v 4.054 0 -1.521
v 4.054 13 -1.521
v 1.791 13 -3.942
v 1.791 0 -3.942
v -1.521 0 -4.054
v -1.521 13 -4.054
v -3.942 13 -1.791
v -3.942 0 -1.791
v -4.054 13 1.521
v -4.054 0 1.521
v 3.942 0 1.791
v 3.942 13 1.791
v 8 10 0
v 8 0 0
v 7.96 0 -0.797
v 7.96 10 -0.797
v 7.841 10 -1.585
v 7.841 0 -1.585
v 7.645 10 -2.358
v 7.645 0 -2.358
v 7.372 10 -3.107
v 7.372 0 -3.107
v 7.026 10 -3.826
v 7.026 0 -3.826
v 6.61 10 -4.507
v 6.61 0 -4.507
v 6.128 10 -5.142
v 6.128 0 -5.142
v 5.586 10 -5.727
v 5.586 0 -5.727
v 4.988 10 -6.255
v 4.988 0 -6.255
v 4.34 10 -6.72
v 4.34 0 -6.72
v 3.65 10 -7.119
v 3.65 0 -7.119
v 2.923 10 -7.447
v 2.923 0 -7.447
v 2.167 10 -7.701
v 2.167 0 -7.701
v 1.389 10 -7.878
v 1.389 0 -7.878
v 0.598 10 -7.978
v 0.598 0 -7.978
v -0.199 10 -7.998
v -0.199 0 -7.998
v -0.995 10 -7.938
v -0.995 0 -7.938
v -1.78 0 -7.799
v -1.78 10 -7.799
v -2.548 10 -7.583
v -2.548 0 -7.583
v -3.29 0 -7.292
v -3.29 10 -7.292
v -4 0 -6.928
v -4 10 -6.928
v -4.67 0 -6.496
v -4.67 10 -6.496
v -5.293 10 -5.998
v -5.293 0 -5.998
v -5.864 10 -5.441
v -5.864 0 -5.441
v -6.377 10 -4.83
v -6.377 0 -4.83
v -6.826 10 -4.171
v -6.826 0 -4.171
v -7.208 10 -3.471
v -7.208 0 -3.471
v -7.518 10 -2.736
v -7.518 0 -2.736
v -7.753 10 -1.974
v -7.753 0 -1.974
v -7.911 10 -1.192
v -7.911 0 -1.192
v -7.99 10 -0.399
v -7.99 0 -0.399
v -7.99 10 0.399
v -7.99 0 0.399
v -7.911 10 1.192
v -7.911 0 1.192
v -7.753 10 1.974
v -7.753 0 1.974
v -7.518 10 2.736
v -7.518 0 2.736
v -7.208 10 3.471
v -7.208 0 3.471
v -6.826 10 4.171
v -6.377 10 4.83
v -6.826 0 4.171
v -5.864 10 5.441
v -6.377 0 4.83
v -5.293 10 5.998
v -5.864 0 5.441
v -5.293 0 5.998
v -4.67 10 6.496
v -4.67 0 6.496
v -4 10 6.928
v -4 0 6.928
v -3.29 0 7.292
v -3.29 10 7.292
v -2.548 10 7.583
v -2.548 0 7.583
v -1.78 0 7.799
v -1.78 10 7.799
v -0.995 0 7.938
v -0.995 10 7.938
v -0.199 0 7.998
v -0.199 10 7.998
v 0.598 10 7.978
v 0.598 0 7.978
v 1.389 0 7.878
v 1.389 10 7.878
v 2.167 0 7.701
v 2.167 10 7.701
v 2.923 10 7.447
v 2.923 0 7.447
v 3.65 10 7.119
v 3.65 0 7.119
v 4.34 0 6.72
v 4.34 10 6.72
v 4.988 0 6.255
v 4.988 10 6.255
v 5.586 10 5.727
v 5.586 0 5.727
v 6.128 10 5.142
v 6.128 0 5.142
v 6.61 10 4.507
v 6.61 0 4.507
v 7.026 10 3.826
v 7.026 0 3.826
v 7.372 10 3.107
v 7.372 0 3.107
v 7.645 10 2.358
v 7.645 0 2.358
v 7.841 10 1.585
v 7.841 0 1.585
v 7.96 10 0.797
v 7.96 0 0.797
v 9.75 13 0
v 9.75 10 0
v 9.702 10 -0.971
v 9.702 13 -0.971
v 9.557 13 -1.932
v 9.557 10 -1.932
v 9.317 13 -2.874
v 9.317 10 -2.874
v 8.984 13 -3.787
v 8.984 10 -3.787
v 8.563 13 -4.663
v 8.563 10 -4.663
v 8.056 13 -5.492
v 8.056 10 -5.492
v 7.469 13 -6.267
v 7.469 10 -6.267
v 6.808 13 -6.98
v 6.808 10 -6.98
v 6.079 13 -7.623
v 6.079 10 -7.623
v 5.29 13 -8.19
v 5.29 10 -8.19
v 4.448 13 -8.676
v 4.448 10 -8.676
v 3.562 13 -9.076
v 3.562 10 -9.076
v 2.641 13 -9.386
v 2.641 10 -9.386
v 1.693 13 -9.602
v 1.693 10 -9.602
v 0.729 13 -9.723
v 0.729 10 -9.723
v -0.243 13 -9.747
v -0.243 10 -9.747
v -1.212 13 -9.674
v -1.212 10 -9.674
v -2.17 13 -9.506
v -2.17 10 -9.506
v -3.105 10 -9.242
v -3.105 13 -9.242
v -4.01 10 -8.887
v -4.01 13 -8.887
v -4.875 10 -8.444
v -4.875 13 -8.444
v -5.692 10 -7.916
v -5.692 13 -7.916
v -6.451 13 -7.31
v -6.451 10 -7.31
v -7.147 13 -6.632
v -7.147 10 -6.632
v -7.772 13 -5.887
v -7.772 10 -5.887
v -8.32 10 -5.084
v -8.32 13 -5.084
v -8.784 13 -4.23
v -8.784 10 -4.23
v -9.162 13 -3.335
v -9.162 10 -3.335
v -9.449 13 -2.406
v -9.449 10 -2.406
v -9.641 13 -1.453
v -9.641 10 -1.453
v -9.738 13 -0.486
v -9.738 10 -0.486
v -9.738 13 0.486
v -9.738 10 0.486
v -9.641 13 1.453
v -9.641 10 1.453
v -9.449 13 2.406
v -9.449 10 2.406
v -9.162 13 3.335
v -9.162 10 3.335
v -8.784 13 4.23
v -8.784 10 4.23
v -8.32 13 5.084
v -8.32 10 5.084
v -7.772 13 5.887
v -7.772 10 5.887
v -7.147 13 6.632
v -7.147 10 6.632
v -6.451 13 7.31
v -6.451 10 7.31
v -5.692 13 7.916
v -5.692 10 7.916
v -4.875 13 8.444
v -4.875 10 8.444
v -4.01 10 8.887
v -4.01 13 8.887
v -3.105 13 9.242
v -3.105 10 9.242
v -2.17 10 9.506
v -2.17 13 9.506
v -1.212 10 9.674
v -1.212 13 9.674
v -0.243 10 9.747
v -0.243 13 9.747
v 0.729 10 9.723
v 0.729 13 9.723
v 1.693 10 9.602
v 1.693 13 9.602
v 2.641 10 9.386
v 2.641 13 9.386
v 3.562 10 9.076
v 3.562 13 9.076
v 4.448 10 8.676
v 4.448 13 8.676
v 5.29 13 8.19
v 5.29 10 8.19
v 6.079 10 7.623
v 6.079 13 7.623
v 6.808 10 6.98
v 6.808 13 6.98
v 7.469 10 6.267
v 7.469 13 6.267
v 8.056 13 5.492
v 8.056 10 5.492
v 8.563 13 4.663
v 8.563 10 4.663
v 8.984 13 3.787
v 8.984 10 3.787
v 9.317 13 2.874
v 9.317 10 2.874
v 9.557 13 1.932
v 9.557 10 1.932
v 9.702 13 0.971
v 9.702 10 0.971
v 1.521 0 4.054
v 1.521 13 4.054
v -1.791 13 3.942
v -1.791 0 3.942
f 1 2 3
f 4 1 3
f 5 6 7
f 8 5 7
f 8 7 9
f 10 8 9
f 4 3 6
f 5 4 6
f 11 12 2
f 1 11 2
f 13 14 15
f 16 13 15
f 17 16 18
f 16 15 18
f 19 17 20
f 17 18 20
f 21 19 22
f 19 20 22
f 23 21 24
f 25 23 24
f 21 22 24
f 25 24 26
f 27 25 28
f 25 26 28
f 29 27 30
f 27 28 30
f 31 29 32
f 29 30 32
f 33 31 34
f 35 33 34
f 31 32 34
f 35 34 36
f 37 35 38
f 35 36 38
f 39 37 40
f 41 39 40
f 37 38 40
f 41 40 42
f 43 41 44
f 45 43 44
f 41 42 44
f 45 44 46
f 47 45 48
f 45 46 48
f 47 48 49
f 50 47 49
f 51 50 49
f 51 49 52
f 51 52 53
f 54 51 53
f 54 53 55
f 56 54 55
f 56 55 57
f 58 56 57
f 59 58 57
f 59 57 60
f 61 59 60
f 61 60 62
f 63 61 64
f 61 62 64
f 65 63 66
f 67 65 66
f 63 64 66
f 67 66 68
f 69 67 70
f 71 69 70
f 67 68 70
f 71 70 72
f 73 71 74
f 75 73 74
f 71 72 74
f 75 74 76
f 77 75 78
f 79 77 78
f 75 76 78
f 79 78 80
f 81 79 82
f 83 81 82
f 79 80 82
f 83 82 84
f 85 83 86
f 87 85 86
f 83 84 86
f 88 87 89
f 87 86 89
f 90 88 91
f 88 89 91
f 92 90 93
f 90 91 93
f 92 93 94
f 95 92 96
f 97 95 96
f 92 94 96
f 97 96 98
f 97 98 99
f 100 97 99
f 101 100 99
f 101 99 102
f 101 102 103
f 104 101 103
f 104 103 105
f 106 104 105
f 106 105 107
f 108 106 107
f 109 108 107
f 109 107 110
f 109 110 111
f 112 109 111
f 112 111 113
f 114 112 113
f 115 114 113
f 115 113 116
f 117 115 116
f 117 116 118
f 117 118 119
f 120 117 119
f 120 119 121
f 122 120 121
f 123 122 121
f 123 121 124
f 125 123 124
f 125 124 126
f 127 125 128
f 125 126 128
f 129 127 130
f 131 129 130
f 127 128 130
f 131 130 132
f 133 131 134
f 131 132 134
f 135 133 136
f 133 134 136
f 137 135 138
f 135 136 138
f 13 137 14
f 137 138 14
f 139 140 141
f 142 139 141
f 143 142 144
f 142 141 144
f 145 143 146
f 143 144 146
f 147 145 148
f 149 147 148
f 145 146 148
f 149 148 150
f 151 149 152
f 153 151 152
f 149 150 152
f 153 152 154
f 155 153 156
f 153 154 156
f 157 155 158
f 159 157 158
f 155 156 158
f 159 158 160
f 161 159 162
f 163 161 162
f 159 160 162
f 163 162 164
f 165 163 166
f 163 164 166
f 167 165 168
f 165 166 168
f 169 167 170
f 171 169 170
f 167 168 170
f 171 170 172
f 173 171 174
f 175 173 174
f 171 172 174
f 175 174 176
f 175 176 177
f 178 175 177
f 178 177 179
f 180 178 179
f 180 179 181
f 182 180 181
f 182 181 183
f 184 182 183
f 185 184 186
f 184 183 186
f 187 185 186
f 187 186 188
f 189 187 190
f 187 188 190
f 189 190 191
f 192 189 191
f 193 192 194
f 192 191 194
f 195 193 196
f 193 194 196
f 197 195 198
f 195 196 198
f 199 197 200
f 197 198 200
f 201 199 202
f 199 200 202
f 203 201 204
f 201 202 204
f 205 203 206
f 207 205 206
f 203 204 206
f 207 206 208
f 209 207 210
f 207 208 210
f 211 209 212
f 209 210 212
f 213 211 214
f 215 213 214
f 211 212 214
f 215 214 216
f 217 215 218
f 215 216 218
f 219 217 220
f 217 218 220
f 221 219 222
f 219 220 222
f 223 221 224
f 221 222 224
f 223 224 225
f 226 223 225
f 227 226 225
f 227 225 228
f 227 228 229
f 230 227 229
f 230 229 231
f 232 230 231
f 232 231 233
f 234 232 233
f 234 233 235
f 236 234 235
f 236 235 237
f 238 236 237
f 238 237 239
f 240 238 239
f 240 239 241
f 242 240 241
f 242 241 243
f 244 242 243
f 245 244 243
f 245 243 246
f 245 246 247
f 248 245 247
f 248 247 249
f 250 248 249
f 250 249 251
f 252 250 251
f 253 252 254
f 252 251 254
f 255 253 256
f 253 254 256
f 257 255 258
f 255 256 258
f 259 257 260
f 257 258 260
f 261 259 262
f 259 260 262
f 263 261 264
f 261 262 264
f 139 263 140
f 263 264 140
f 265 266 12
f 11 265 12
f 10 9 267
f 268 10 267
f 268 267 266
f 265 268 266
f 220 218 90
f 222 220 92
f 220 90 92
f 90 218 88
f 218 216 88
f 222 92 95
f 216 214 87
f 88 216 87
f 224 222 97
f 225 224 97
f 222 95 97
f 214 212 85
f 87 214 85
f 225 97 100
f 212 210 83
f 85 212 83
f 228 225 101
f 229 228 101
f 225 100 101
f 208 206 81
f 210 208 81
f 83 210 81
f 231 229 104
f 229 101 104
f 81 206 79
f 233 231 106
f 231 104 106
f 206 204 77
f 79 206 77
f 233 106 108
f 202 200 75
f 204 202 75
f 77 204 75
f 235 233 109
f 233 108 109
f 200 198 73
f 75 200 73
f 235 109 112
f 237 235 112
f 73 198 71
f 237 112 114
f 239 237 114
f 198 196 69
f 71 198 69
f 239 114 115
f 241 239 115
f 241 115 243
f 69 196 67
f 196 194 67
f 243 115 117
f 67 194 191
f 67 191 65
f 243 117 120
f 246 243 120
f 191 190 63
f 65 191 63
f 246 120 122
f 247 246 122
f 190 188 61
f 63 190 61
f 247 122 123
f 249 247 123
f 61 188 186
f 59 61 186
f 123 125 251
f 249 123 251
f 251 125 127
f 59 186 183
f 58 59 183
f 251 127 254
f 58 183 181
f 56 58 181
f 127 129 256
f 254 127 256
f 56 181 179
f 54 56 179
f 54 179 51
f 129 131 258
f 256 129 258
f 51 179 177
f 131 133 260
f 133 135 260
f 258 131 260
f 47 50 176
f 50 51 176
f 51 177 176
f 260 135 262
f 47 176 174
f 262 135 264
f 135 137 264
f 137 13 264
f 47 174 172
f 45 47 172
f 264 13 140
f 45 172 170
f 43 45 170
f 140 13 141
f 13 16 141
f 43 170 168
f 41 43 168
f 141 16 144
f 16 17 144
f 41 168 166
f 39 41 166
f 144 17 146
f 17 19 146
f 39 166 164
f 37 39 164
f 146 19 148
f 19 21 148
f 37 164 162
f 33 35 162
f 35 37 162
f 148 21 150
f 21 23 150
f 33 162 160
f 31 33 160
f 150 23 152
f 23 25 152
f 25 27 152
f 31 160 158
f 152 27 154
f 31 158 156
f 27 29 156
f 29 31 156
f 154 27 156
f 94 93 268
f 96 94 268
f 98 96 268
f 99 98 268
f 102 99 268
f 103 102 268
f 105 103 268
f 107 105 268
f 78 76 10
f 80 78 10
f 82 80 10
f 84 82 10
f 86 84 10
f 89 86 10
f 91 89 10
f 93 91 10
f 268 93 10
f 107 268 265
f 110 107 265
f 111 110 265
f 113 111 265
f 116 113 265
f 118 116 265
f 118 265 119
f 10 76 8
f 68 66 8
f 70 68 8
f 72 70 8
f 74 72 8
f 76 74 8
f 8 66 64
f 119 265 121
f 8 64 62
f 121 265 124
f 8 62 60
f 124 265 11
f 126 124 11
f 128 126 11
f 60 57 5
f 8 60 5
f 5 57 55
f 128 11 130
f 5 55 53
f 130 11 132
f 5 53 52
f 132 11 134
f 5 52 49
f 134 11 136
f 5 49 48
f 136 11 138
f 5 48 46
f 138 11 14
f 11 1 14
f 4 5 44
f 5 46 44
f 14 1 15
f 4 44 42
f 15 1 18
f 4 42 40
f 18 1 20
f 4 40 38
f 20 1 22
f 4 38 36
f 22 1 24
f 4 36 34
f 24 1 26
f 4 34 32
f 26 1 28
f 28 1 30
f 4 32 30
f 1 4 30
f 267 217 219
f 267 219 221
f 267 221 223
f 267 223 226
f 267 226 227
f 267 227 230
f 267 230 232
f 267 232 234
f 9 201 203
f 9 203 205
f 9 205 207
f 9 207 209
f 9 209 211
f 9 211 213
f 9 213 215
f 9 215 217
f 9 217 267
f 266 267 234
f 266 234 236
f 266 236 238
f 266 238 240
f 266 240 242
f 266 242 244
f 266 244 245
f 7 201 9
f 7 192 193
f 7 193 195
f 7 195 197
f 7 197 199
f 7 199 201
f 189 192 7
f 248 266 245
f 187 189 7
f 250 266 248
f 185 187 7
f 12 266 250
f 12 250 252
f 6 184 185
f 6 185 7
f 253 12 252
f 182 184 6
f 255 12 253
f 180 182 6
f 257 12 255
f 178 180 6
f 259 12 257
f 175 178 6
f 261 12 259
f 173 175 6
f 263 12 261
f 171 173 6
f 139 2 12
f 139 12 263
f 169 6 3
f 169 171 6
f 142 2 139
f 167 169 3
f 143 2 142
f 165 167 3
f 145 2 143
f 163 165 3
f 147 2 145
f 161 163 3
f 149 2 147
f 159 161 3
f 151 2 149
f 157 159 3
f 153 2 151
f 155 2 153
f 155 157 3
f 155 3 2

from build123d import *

# Parameters (mm, degrees)
SKETCH1_R           = 8
BOSS_EXTRUDE1_DEPTH = 10
SKETCH2_R           = 9.75
BOSS_EXTRUDE2_DEPTH = 3
CUT_EXTRUDE1_DEPTH  = 14


with BuildPart() as part:
    # Sketch1 → Boss-Extrude1 (new body)
    with BuildSketch(Plane(origin=(0, 0, 0), x_dir=(1, 0, 0), z_dir=(0, 1, 0))):
        Circle(SKETCH1_R)
    extrude(amount=BOSS_EXTRUDE1_DEPTH)

    # Sketch2 → Boss-Extrude2 (add)
    with BuildSketch(Plane(origin=(0, 10, 0), x_dir=(1, 0, 0), z_dir=(0, 1, 0))):
        Circle(SKETCH2_R)
    extrude(amount=BOSS_EXTRUDE2_DEPTH)

    # Sketch3 → Cut-Extrude1 (cut, through all)
    with BuildSketch(Plane(origin=(0, 13, 0), x_dir=(1, 0, 0), z_dir=(0, 1, 0))):
        Polygon((3.941633327, -1.791282422), (4.053783603, 1.520527707), (1.791282422, 3.941633327), (-1.520527707, 4.053783603), (-3.941633327, 1.791282422), (-4.053783603, -1.520527707), (-1.791282422, -3.941633327), (1.520527707, -4.053783603), align=None)
    extrude(amount=-CUT_EXTRUDE1_DEPTH, mode=Mode.SUBTRACT)


solid = part.part
